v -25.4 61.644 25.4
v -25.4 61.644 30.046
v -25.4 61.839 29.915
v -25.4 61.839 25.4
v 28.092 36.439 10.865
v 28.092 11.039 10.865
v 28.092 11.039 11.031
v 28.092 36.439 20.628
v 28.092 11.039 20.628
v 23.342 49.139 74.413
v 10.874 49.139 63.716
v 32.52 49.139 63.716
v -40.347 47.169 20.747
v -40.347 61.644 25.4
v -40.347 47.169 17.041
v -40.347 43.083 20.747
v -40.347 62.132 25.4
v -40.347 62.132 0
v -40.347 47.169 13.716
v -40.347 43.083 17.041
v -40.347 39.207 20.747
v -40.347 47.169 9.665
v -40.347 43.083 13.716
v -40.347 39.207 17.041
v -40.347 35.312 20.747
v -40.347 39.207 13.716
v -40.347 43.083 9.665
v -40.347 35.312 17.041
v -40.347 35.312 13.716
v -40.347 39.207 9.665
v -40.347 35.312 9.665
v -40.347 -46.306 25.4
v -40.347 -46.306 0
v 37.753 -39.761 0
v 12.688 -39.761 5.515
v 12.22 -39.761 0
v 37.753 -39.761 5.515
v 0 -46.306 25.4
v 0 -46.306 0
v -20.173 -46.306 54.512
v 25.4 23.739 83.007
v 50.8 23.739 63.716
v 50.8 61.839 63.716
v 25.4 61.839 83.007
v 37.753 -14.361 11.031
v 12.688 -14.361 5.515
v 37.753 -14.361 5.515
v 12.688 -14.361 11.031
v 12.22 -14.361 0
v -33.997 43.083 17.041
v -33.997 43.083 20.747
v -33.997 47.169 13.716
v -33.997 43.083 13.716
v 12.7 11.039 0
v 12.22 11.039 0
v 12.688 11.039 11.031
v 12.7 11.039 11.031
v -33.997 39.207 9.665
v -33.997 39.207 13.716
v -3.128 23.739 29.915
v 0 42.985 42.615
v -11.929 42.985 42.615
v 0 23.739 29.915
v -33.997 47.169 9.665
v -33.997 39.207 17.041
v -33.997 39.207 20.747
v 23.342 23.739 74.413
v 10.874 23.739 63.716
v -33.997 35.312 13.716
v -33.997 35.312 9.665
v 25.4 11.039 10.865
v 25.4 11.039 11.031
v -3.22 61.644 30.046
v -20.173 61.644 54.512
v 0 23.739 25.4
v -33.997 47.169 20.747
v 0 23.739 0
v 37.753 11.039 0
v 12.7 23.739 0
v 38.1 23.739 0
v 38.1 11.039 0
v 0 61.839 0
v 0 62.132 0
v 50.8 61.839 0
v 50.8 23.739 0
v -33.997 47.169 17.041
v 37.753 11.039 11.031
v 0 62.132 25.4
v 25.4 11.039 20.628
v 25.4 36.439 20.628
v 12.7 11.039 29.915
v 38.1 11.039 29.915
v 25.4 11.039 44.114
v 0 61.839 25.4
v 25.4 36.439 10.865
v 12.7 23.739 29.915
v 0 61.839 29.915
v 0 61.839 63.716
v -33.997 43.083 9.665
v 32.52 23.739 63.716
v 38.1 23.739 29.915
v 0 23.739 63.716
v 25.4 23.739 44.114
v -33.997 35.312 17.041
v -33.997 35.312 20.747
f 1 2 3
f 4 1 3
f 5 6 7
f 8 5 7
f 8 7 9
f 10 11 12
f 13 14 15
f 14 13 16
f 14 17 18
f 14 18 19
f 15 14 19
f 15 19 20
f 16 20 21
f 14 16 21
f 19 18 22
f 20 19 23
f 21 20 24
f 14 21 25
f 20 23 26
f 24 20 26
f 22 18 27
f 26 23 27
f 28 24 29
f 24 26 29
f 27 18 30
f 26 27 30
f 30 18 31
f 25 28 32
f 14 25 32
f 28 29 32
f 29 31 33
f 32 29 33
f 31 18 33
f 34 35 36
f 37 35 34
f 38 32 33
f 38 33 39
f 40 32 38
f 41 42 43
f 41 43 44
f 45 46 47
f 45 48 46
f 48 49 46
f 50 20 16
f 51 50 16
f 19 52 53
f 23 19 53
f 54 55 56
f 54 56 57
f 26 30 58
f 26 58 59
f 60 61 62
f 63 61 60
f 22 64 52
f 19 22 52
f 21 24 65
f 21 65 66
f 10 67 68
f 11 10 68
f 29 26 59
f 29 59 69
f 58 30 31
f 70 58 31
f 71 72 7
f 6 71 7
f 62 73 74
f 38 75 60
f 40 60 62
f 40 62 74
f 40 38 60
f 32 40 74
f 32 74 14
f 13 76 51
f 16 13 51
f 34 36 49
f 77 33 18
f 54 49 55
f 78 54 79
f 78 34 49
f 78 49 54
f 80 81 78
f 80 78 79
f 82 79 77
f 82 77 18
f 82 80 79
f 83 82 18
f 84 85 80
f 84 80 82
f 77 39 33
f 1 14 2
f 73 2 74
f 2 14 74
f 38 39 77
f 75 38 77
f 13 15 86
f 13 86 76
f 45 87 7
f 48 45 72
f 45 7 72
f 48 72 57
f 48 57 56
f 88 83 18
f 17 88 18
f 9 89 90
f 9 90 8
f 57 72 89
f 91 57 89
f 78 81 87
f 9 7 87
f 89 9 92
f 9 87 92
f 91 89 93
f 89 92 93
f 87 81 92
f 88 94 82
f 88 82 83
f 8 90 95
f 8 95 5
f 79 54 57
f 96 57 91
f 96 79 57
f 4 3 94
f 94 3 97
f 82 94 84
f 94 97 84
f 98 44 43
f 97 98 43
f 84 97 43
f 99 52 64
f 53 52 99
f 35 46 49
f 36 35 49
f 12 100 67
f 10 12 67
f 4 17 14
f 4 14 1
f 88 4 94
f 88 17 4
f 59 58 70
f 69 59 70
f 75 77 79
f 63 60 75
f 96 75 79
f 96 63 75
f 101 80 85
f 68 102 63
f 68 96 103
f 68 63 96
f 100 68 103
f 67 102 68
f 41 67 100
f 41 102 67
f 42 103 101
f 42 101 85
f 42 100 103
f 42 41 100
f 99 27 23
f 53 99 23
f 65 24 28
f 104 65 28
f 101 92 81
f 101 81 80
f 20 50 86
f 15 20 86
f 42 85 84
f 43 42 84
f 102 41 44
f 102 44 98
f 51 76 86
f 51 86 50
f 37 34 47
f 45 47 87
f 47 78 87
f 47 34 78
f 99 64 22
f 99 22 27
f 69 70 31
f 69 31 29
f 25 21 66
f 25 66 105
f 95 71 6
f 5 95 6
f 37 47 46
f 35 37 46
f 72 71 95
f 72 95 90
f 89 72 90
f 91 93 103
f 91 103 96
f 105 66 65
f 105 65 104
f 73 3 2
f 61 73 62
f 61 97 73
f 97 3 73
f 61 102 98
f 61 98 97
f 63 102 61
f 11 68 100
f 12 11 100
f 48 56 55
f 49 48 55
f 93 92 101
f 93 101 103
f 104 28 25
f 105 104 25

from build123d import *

# Parameters (mm, degrees)
F0_W      = 38.1
F0_H      = 19.05
F1_DEPTH  = 50.8
F2_W      = 25.4
F2_H      = 19.05
F3_DEPTH  = 12.7
F5_DEPTH  = 31.75
F8_DEPTH  = 25.4
F10_DEPTH = 107.95
F11_W     = 38.1
F11_H     = 10.8646959405
F12_DEPTH = 50.8
F14_DEPTH = 25.4
F16_DEPTH = 25.4
F17_W     = 12.7
F17_H     = 10.8646959405
F18_DEPTH = 25.4
F6_W      = 2.6920993537
F6_H      = 9.7637060691
F19_DEPTH = 25.4
F20_DEPTH = 25.4
F21_W     = 11.8566676974
F21_H     = 11.0813332722
F22_DEPTH = 6.35
F23_W     = 4.0861964226
F23_H     = 3.3253813162
F23_W_2   = 3.8762353361
F23_H_2   = 3.7055220455
F23_W_3   = 3.8942359388
F23_H_3   = 4.0504299104
F24_DEPTH = 6.35
F26_DEPTH = 38.1
F28_DEPTH = 38.1
F30_DEPTH = 25.4


with BuildPart() as f1:
    # F0 (on Right) → F1 (new body)
    with BuildSketch(Plane.YZ):
        with Locations((42.7892319858, 20.3896959405)):
            Rectangle(F0_W, F0_H)
        Polygon((23.7392319858, 29.9146959405), (61.8392319858, 29.9146959405), (42.9846160114, 42.6146959405), align=None)
    extrude(amount=F1_DEPTH)

    # F2 (on face) → F3 (join)
    with BuildSketch(Plane.XZ.offset(-23.7392319858)):
        with Locations((25.4, 20.3896959405)):
            Rectangle(F2_W, F2_H)
    extrude(amount=F3_DEPTH)

    # F4 (on face) → F5 (join)
    with BuildSketch(Plane.XZ.offset(-11.0392319858)):
        Polygon((25.4, 44.1137275976), (12.7, 29.9146959405), (38.1, 29.9146959405), align=None)
    extrude(amount=-F5_DEPTH)

    # F7 (on Top) → F8 (join)
    with BuildSketch(Plane.XY):
        Polygon((0, 23.8369237632), (0, 62.1323101223), (-40.3469242156, 62.1323101223), (-40.3469242156, -46.306155622), (0, -46.306155622), align=None)
    extrude(amount=F8_DEPTH)

    # F9 (on face) → F10 (join)
    with BuildSketch(Plane.XZ.offset(46.306155622)):
        Polygon((-20.1734621078, 54.5123107731), (-40.3469242156, 25.4), (0, 25.4), align=None)
    extrude(amount=-F10_DEPTH)

    # F11 (on face) → F12 (join)
    with BuildSketch(Plane.YZ.offset(50.8)):
        with Locations((42.7892319858, 5.4323479703)):
            Rectangle(F11_W, F11_H)
    extrude(amount=-F12_DEPTH)

    # F13 (on face) → F14 (join)
    with BuildSketch(Plane.XZ.offset(-11.0392319858)):
        Polygon((37.7532355487, 11.0308341682), (12.6882037148, 11.0308341682), (12.2203705832, 0), (37.7532355487, 0), align=None)
    extrude(amount=F14_DEPTH)

    # F15 (on face) → F16 (join)
    with BuildSketch(Plane.XZ.offset(14.3607680142)):
        Polygon((37.7532355487, 0), (37.7532355487, 5.5154170841), (12.6882037148, 5.5154170841), (12.2203705832, 0), align=None)
    extrude(amount=F16_DEPTH)

    # F17 (on face) → F18 (join)
    with BuildSketch(Plane.YZ.offset(38.1)):
        with Locations((17.3892319858, 5.4323479703)):
            Rectangle(F17_W, F17_H)
    extrude(amount=-F18_DEPTH)

    # F6 (on face) → F19 (cut)
    with BuildSketch(Plane.XZ.offset(-11.0392319858)):
        with Locations((26.7460496768, 15.7465489751)):
            Rectangle(F6_W, F6_H)
    extrude(amount=-F19_DEPTH, mode=Mode.SUBTRACT)

    # F20 (add): a face of the model
    f20_faces = [f1.faces().sort_by_distance(p)[0] for p in [
        (0, 42.8272968204, 31.4509034),
    ]]
    extrude(f20_faces, amount=F20_DEPTH)

    # F21 (on face) → F22 (cut)
    with BuildSketch(Plane(origin=(-40.3469242156, 0, 0), x_dir=(0, -1, 0), z_dir=(-1, 0, 0))):
        with Locations((-41.2407740951, 15.2060096152)):
            Rectangle(F21_W, F21_H)
    extrude(amount=-F22_DEPTH, mode=Mode.SUBTRACT)

    # F23 (on face) → F24 (join)
    with BuildSketch(Plane(origin=(-33.9969242156, 0, 0), x_dir=(0, -1, 0), z_dir=(-1, 0, 0))):
        with Locations((-45.1260097325, 15.3784635477)):
            Rectangle(F23_W, F23_H)
        with Locations((-41.1447938532, 15.3784635477)):
            Rectangle(F23_W_2, F23_H)
        with Locations((-41.1447938532, 18.8939152285)):
            Rectangle(F23_W_2, F23_H_2)
        with Locations((-37.2595582157, 15.3784635477)):
            Rectangle(F23_W_3, F23_H)
        with Locations((-41.1447938532, 11.6905579343)):
            Rectangle(F23_W_2, F23_H_3)
    extrude(amount=F24_DEPTH)

    # F25 (on face) → F26 (join)
    with BuildSketch(Plane.XZ.offset(-23.7392319858)):
        Polygon((38.1, 29.9146959405), (50.8, 29.9146959405), (50.8, 63.7161359191), (0, 63.7161359191), (0, 29.9146959405), align=None)
    extrude(amount=-F26_DEPTH)

    # F27 (on face) → F28 (join)
    with BuildSketch(Plane.XZ.offset(-23.7392319858)):
        Polygon((25.4, 83.0065757036), (0, 63.7161359191), (50.8, 63.7161359191), align=None)
    extrude(amount=-F28_DEPTH)

    # F29 (on face) → F30 (cut)
    with BuildSketch(Plane.XZ.offset(-23.7392319858)):
        Polygon((23.3422555029, 74.4133889675), (10.8735319227, 63.7161359191), (32.519716375, 63.7161359191), align=None)
    extrude(amount=-F30_DEPTH, mode=Mode.SUBTRACT)


solid = f1.part
